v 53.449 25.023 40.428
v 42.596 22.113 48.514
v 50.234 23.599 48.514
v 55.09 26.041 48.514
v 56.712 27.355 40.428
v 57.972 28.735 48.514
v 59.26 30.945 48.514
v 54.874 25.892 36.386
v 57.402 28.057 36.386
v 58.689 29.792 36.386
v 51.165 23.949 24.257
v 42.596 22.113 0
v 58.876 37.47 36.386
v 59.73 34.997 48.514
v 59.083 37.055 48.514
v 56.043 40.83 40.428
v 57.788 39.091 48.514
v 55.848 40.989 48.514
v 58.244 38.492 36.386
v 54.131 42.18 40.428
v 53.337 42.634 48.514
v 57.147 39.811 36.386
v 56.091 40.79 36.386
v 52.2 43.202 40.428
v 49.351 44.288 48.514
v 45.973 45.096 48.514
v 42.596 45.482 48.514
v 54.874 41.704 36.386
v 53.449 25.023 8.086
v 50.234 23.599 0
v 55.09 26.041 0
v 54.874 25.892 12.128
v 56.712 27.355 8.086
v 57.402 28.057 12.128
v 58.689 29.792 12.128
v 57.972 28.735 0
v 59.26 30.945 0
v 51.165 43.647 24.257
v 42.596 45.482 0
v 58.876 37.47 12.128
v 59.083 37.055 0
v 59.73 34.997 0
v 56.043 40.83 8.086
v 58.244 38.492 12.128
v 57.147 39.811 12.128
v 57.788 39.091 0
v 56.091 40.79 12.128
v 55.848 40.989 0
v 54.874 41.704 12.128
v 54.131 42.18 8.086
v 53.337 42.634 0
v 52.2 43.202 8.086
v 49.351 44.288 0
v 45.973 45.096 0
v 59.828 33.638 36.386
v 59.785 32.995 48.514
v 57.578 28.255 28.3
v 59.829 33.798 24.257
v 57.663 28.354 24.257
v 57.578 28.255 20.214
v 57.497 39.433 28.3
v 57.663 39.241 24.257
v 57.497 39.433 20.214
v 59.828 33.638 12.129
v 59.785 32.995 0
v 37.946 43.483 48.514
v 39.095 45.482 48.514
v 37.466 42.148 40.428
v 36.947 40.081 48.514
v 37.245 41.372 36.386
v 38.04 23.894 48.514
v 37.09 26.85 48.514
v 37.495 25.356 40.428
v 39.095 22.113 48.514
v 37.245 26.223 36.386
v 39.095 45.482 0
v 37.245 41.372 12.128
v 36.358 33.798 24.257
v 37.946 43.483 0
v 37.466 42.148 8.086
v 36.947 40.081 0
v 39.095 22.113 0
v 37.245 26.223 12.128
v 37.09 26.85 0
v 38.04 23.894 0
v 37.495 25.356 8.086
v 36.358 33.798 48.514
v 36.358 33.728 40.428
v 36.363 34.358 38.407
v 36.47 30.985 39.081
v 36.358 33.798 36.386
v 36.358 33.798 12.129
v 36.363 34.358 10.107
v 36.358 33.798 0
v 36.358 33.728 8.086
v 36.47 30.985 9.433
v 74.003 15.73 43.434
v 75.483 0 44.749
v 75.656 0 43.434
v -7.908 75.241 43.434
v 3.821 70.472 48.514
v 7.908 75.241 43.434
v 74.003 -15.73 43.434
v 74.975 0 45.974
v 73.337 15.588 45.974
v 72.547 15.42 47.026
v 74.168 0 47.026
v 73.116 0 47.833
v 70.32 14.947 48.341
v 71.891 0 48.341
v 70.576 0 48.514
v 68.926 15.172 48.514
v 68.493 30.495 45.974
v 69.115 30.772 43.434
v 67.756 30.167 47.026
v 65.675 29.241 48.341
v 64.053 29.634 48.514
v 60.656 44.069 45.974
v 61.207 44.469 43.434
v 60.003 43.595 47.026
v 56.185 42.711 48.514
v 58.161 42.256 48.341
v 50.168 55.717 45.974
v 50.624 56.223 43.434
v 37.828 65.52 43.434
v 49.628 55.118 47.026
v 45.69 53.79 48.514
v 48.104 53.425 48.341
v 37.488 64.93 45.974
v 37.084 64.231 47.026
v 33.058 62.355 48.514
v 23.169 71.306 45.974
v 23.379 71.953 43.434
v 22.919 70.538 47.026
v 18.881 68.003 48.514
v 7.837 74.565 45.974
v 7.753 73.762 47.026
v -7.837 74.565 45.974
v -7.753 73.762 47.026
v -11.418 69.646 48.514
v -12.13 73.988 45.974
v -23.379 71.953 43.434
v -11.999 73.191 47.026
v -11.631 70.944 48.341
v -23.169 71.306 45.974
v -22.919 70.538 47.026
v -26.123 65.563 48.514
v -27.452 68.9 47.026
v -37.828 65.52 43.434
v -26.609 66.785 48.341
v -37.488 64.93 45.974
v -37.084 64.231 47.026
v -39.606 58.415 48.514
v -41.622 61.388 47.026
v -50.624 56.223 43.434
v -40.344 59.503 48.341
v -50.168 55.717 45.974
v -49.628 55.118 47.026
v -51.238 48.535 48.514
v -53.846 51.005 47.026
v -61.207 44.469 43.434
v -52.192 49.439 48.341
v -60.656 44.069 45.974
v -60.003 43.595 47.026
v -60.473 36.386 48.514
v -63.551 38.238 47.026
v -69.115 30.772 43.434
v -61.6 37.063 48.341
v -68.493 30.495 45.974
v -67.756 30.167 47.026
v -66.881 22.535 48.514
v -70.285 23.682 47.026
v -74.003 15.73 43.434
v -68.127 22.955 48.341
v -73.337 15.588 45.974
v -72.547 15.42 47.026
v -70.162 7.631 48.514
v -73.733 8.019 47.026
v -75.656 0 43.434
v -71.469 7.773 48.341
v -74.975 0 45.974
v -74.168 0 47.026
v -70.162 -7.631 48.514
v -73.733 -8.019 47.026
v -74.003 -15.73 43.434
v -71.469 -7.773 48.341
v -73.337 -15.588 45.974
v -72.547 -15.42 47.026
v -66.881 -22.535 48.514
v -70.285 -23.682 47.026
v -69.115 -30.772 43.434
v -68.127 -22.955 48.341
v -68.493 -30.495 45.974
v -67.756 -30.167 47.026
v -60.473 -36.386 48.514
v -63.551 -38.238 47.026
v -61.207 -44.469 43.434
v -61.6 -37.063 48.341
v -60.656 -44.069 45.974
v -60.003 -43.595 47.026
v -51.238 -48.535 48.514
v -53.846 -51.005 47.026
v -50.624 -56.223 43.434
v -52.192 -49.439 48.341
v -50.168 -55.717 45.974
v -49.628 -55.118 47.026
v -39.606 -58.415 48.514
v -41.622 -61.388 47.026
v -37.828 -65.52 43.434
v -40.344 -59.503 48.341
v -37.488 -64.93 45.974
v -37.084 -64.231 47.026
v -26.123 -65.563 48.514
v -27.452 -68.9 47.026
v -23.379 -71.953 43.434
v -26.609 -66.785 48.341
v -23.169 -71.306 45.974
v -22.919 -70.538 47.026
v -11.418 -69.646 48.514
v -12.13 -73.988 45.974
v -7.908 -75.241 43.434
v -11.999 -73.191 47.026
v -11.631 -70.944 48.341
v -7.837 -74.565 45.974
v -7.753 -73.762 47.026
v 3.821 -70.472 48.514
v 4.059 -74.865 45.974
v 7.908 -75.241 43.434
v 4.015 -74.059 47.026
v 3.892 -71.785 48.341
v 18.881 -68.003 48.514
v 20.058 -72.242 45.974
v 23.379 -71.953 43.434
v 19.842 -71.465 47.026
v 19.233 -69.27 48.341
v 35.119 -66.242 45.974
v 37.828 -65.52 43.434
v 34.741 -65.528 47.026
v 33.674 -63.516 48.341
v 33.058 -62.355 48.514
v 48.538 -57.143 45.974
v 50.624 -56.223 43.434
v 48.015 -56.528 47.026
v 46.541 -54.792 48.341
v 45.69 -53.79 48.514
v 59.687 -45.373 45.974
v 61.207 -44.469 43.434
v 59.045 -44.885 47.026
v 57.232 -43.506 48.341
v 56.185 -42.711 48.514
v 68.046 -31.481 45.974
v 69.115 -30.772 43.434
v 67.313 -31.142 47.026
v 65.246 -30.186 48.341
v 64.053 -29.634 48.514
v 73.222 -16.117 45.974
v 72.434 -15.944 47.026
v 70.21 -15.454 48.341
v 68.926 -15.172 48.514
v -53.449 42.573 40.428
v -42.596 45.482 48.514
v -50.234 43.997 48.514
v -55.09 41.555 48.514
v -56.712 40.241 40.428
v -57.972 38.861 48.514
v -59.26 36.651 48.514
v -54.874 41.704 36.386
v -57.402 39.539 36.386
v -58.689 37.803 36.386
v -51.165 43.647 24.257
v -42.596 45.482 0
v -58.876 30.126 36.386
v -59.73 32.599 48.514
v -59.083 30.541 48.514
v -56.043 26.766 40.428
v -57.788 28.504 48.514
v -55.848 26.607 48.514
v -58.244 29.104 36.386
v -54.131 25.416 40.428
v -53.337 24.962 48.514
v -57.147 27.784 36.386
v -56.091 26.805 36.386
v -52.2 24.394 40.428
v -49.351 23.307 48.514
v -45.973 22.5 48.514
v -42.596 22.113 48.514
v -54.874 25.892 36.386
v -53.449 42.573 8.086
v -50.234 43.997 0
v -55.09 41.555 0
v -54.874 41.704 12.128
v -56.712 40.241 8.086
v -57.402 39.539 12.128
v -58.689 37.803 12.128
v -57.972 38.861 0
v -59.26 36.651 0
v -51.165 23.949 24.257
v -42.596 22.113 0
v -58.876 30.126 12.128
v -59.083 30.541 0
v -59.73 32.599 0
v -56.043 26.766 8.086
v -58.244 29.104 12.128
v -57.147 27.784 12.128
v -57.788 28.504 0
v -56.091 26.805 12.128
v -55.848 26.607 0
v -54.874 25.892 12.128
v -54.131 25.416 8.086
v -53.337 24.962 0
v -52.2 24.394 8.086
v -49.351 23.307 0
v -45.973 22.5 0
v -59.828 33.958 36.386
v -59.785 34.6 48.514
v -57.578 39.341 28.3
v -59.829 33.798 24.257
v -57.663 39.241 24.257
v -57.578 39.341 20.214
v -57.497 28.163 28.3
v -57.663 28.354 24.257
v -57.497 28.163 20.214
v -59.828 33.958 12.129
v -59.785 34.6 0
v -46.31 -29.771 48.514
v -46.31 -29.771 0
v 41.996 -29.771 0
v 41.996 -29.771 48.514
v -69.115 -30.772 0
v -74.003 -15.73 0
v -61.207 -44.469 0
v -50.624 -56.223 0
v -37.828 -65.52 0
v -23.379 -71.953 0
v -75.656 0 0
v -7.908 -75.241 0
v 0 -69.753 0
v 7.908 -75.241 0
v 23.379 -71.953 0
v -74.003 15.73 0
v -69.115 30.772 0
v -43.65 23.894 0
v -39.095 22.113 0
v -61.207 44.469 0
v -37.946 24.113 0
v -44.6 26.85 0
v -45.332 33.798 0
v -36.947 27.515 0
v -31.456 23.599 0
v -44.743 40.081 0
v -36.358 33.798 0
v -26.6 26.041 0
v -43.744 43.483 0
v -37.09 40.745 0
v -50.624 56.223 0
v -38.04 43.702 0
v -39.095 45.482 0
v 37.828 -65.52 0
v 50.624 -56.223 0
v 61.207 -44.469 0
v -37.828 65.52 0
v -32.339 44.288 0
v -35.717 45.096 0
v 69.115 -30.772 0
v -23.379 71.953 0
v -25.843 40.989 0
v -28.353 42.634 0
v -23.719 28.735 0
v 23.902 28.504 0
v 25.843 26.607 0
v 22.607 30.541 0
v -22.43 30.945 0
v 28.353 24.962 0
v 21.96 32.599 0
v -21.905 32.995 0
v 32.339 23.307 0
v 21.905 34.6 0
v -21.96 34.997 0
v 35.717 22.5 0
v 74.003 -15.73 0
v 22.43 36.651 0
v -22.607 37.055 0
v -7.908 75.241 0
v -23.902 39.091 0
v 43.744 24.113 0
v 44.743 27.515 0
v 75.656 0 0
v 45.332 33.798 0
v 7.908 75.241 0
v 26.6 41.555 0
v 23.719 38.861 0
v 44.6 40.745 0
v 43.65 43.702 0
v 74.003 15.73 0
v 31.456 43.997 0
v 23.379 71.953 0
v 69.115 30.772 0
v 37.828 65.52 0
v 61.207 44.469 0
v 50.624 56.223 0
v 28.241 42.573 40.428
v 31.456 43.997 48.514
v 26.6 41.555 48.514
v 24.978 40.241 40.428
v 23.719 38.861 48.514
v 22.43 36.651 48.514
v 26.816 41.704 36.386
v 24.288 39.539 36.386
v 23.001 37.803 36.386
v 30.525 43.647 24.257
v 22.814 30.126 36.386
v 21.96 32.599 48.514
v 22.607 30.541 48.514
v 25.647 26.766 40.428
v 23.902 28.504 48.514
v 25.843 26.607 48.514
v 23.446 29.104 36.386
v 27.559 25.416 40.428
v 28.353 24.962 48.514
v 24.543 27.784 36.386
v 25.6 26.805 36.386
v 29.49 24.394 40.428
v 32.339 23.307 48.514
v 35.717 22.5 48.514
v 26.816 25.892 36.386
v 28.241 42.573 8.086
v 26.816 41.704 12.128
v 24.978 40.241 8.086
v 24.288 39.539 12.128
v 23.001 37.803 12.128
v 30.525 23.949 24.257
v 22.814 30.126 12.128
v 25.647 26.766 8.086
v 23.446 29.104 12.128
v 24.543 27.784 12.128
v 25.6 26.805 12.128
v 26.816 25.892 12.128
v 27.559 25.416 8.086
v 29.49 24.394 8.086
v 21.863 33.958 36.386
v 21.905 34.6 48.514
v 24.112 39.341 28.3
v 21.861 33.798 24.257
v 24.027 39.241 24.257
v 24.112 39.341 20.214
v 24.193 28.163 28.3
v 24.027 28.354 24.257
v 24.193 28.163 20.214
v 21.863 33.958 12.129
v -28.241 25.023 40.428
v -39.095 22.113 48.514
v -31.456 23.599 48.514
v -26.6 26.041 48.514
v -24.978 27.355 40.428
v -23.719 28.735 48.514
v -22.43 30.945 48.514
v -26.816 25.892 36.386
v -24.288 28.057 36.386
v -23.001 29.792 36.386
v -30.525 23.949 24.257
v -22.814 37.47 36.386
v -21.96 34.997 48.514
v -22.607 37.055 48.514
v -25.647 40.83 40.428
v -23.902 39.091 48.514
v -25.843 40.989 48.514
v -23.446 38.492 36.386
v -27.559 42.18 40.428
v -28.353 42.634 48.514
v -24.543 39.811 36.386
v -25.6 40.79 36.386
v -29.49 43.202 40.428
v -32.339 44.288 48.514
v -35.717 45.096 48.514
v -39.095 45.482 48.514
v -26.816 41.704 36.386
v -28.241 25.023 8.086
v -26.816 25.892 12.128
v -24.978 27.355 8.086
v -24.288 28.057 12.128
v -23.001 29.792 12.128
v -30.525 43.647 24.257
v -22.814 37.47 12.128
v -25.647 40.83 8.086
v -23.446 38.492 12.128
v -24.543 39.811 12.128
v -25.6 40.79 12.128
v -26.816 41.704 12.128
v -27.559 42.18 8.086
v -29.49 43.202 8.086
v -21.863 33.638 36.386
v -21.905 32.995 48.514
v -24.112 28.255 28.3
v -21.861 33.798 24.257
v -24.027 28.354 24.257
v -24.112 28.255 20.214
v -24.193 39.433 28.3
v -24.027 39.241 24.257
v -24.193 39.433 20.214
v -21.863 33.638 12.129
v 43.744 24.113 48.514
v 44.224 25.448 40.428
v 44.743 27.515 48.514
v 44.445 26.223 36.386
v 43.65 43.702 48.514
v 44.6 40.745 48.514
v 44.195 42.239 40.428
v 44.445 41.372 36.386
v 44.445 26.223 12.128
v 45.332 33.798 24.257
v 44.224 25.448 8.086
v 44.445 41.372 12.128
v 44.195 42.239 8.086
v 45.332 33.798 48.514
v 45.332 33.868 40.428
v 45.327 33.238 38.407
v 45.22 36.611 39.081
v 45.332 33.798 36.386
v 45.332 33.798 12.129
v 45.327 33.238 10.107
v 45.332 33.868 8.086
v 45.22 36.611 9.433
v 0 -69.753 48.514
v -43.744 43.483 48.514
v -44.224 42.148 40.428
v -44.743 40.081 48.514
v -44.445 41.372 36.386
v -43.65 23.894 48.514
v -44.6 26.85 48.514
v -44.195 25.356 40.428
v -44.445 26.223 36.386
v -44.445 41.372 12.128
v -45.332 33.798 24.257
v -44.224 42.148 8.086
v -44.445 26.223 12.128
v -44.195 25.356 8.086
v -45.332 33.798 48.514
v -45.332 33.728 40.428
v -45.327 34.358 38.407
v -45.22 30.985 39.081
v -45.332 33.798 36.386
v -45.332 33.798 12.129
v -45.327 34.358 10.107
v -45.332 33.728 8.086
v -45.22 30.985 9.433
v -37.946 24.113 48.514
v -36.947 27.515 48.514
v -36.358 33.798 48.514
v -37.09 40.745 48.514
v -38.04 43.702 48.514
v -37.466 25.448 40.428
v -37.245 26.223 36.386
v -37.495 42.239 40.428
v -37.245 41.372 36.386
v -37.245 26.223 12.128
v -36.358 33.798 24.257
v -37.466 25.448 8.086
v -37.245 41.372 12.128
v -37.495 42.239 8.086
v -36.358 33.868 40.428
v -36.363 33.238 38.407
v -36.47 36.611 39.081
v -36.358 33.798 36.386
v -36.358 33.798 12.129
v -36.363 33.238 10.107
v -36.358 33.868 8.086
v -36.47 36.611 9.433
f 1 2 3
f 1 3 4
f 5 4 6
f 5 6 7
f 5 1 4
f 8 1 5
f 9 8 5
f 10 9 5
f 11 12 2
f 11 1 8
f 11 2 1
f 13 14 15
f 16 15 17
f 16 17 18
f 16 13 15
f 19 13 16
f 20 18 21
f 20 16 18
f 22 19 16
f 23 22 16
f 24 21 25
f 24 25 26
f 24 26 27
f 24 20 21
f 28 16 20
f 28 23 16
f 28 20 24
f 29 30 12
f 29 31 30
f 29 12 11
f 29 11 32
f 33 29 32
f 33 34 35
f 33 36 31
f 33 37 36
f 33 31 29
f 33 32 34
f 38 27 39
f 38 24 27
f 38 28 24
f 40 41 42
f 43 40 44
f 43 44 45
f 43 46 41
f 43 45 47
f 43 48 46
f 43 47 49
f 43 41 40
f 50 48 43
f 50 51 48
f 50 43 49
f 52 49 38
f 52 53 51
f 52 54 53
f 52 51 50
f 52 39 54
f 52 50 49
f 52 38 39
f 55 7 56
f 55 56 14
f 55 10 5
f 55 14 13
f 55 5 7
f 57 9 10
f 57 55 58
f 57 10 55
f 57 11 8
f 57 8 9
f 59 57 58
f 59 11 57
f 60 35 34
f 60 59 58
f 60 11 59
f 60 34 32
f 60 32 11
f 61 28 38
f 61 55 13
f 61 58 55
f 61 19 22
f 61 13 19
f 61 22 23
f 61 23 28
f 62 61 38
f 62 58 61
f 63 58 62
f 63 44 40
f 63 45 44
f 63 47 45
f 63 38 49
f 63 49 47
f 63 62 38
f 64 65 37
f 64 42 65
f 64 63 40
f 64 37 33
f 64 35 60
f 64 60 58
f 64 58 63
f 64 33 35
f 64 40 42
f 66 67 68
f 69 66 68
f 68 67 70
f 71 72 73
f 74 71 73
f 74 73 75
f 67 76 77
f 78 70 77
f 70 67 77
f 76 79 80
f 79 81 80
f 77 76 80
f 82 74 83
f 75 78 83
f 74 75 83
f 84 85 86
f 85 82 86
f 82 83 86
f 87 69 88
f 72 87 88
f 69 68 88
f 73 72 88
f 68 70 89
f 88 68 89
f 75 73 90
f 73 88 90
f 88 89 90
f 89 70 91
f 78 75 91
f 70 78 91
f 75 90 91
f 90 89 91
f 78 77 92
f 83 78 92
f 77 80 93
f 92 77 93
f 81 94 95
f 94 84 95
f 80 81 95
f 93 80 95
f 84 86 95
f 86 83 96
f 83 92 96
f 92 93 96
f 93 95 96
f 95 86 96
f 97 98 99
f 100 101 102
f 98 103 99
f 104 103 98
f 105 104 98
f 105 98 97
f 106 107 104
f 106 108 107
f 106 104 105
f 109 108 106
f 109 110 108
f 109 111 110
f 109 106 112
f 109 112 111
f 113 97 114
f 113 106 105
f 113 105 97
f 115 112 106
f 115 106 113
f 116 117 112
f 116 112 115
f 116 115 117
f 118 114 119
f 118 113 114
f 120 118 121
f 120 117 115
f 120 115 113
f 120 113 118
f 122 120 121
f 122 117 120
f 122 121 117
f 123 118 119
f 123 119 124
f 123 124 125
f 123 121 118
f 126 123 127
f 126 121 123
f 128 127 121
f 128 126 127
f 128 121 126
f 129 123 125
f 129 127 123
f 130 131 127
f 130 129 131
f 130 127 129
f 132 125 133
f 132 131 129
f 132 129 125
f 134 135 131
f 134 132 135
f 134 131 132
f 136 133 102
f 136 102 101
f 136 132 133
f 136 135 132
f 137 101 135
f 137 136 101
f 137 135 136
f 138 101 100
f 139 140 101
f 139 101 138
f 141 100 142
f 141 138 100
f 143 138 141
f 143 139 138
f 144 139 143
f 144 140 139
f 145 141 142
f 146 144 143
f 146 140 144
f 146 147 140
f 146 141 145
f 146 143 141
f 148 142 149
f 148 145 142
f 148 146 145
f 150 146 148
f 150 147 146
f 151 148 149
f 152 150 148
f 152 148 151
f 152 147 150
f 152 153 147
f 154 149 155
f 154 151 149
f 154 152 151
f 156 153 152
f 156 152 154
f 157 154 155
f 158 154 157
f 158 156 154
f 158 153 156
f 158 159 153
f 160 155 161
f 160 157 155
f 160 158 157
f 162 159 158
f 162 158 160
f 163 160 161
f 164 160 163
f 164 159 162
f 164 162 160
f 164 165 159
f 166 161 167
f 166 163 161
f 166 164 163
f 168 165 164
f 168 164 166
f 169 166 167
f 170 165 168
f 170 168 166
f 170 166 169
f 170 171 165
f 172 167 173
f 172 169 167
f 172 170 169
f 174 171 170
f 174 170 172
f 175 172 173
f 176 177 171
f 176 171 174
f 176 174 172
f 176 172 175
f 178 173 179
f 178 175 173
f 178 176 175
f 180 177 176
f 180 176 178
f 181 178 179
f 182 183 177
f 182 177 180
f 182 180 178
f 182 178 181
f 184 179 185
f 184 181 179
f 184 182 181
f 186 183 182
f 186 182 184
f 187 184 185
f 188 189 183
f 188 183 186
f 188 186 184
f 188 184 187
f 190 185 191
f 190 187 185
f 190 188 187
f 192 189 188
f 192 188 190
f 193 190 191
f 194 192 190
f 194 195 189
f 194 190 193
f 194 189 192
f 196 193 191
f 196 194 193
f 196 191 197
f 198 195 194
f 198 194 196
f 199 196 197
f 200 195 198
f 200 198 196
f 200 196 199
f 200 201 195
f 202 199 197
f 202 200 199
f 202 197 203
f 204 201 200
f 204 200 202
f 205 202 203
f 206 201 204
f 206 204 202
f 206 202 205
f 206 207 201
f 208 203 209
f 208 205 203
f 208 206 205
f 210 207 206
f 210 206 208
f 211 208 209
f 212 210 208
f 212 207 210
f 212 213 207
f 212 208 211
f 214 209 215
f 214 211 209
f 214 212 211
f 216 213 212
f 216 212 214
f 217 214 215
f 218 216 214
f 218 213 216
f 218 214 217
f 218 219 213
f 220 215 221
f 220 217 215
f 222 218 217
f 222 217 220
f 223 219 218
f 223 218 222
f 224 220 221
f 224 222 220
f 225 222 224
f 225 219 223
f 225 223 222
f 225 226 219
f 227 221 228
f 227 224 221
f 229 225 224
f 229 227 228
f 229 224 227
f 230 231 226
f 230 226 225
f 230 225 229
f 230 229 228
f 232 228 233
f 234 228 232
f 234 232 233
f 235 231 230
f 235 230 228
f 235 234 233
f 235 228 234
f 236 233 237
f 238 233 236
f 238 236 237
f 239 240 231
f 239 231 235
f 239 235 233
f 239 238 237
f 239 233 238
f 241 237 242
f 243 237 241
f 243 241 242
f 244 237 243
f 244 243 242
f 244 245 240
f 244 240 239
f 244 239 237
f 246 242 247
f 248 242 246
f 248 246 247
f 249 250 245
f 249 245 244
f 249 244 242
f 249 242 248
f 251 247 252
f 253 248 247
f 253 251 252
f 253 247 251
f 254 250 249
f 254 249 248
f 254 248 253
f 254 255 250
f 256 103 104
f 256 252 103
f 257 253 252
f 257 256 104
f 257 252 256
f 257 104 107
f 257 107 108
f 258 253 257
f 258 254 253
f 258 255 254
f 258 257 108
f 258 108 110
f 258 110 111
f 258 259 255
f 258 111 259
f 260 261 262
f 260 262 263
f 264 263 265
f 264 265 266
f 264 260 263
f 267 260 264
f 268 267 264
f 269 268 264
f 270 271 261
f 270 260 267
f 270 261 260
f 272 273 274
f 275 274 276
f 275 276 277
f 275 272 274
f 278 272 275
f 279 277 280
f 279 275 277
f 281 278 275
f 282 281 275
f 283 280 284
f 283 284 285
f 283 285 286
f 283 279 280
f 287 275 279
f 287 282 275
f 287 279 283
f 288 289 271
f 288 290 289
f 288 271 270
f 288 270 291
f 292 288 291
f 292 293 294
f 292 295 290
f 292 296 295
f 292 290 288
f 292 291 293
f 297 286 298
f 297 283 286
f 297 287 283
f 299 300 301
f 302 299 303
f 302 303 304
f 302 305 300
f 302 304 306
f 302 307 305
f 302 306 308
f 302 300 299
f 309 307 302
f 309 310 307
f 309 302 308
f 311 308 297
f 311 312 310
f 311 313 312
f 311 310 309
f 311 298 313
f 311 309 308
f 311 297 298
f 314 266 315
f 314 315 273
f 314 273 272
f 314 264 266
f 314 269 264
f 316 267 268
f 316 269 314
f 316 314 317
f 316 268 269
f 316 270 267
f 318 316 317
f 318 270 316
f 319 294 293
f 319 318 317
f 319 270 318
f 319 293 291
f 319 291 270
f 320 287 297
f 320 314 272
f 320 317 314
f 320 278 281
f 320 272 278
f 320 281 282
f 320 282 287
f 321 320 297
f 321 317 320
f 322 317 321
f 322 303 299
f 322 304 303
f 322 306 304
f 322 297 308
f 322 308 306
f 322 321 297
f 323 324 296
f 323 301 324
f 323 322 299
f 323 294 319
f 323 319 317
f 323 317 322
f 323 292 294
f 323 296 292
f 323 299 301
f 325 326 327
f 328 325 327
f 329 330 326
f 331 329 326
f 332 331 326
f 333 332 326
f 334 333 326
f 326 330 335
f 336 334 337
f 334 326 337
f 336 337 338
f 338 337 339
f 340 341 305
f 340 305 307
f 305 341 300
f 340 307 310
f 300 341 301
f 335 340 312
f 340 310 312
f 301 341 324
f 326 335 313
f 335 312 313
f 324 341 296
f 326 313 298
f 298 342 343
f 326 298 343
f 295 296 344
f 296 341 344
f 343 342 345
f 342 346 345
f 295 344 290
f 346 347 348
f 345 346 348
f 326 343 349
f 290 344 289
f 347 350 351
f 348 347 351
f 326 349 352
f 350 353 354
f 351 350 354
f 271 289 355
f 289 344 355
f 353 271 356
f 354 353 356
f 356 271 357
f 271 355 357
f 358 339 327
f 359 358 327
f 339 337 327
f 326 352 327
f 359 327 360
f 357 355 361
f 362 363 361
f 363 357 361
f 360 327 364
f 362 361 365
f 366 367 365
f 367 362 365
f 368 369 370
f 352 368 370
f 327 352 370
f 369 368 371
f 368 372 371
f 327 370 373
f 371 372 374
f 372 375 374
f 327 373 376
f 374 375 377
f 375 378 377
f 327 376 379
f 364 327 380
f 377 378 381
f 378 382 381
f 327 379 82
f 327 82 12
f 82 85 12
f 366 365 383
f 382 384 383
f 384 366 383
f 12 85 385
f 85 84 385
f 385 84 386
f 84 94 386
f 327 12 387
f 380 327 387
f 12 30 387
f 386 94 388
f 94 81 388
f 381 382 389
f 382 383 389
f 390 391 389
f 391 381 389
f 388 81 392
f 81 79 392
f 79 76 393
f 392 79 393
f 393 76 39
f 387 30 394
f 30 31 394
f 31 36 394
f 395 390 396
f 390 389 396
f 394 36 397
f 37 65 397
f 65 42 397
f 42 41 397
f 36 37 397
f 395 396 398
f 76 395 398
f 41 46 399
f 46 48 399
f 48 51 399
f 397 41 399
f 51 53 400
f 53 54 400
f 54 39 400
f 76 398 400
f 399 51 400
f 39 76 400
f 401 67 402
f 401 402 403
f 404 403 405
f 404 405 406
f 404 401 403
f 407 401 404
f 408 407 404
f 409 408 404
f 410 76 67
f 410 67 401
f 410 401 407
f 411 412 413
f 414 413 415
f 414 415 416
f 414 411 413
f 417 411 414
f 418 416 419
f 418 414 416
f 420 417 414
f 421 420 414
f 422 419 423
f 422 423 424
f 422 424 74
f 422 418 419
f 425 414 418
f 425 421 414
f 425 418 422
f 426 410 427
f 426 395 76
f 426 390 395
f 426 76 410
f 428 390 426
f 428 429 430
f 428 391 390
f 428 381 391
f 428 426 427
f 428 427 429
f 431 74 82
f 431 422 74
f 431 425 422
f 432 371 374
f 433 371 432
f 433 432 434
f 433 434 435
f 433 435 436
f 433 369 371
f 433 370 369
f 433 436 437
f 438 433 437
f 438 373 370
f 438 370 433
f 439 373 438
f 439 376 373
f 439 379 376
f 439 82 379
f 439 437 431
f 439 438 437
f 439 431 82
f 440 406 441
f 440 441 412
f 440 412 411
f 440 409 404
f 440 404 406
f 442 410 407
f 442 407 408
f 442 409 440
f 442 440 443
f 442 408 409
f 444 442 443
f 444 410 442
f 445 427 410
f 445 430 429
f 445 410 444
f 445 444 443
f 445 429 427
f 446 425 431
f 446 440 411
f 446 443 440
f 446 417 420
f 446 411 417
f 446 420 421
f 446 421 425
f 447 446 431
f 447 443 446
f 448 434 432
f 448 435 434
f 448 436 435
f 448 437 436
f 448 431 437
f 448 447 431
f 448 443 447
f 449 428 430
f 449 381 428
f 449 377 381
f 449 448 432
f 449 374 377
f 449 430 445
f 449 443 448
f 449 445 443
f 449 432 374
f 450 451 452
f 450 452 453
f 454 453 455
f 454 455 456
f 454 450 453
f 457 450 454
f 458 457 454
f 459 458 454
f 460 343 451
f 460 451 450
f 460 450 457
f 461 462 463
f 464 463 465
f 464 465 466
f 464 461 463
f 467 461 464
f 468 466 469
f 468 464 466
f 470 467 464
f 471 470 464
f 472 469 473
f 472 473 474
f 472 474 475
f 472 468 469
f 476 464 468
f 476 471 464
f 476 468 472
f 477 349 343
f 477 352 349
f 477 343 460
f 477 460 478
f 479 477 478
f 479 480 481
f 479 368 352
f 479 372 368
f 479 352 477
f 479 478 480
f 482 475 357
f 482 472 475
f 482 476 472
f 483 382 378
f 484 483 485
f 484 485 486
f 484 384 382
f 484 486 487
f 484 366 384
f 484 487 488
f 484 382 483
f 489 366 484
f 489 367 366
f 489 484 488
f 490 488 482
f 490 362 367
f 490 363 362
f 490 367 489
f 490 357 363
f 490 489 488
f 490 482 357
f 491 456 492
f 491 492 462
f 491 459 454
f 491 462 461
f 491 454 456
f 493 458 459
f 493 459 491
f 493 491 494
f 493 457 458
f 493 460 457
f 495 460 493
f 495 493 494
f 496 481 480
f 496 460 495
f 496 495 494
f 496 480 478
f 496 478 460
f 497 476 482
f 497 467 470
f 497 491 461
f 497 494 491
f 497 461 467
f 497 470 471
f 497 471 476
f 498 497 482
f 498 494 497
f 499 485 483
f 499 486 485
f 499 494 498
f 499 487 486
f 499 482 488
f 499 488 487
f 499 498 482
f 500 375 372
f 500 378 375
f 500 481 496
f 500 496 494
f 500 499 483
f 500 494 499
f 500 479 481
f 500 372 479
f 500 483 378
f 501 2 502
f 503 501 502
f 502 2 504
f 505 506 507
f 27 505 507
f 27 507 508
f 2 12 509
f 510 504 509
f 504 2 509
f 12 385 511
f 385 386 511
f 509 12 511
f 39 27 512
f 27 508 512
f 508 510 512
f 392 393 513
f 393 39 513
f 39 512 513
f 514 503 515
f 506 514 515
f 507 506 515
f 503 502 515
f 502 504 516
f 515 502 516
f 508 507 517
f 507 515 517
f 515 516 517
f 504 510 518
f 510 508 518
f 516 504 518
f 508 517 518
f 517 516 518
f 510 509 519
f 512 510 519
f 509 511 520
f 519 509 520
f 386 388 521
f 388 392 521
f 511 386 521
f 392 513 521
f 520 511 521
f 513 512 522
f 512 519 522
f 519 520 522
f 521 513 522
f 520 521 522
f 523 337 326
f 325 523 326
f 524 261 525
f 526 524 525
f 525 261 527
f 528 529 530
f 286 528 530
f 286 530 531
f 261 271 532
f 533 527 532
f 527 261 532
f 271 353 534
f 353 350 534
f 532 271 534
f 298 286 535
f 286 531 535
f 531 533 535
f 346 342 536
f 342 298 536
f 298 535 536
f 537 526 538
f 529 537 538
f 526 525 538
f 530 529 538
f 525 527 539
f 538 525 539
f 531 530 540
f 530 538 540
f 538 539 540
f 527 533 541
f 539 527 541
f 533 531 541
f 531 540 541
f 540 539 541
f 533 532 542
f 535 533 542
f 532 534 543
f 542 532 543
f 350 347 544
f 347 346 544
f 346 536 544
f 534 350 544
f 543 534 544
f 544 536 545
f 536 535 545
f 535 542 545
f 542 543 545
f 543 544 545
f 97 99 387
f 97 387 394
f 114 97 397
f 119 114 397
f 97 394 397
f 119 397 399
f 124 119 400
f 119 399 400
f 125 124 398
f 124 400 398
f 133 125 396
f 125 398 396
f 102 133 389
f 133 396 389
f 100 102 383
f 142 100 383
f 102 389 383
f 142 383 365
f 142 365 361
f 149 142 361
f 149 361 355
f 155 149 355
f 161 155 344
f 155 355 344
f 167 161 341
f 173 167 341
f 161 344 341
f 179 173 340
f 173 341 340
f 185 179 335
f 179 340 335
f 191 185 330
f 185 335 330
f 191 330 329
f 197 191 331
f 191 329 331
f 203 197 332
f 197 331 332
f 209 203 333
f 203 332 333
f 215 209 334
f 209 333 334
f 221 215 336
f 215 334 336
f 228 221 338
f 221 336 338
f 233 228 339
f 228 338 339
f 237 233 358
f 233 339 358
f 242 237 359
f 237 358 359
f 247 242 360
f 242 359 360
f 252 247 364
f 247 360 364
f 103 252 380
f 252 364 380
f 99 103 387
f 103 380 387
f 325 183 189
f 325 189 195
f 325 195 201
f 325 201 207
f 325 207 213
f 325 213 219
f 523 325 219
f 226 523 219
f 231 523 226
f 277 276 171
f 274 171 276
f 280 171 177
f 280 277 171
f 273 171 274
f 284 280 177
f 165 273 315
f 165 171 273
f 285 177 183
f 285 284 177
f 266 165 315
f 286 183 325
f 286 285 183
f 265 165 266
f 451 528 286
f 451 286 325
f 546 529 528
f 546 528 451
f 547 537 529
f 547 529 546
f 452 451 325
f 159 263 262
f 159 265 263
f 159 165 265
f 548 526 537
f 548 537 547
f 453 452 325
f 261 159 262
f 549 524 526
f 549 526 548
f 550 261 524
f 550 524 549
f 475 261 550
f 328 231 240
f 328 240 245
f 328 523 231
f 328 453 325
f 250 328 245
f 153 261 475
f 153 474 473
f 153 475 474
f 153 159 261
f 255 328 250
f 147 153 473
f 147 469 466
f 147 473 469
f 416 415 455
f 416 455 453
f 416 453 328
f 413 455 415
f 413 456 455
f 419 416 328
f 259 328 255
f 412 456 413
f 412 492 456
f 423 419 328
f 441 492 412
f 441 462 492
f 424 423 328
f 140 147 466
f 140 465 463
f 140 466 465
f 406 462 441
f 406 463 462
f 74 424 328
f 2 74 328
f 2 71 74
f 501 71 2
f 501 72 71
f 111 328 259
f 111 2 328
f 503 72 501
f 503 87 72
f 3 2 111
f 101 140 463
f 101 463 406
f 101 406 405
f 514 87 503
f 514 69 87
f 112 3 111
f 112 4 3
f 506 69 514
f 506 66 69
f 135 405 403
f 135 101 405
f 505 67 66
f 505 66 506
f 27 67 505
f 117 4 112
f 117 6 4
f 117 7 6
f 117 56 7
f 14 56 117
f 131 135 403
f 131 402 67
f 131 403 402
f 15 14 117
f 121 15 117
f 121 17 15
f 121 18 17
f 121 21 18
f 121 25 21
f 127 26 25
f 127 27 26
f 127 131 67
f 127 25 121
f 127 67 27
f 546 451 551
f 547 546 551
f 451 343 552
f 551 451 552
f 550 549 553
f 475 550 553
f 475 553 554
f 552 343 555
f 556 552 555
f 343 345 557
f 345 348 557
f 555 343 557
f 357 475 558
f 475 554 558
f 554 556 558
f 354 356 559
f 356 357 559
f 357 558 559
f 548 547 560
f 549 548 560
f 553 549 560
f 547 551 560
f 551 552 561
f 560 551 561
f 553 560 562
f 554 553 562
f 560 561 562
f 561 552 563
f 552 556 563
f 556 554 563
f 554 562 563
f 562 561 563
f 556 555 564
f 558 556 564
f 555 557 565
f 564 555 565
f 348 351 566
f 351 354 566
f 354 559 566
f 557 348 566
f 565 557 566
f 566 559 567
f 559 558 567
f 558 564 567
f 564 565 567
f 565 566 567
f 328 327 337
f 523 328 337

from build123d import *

# Parameters (mm, degrees)
F0_R     = 75.6558411923
F1_DEPTH = 48.514
F2_R     = 5.08


with BuildPart() as f1:
    # F0 (on Top) → F1 (new body)
    with BuildSketch(Plane.XY):
        Circle(F0_R)
        Polygon((0, -69.7530433536), (-46.3102683425, -29.7708865255), (41.9956482947, -29.7708865255), align=None, mode=Mode.SUBTRACT)
        with BuildLine():
            add(Edge.make_bspline(
                [(-21.8607485294, 33.7978675961), (-21.8607485294, 44.4959185344), (-39.0945518587, 45.4823768148)],
                knots=[0, 0, 0, 1.4784559967, 1.4784559967, 1.4784559967], degree=2, weights=[1, 0.73898889, 1]))
            add(Edge.make_bspline(
                [(-39.0945518587, 22.1133583775), (-21.8607485294, 23.0998166579), (-21.8607485294, 33.7978675961)],
                knots=[4.8047293104, 4.8047293104, 4.8047293104, 6.2831853072, 6.2831853072, 6.2831853072], degree=2, weights=[1, 0.73898889, 1]))
            add(Edge.make_bspline(
                [(-40.8450812101, 21.1076120934), (-39.9337015522, 21.1076120934), (-39.0945518587, 22.1133583775)],
                knots=[0, 0, 0, 0.4008066518, 0.4008066518, 0.4008066518], degree=2, weights=[1, 0.9799863696, 1]))
            add(Edge.make_bspline(
                [(-42.5956105616, 22.1133583775), (-41.7564608681, 21.1076120934), (-40.8450812101, 21.1076120934)],
                knots=[5.8823786554, 5.8823786554, 5.8823786554, 6.2831853072, 6.2831853072, 6.2831853072], degree=2, weights=[1, 0.9799863696, 1]))
            add(Edge.make_bspline(
                [(-42.5956105616, 45.4823768148), (-59.8294138908, 44.4959185344), (-59.8294138908, 33.7978675961), (-59.8294138908, 23.0998166579), (-42.5956105616, 22.1133583775)],
                knots=[1.6631366568, 1.6631366568, 1.6631366568, 3.1415926536, 3.1415926536, 4.6200486503, 4.6200486503, 4.6200486503], degree=2, weights=[1, 0.73898889, 1, 0.73898889, 1]))
            add(Edge.make_bspline(
                [(-39.0945518587, 45.4823768148), (-40.8450812101, 47.5804391797), (-42.5956105616, 45.4823768148)],
                knots=[2.7407860018, 2.7407860018, 2.7407860018, 3.5423993054, 3.5423993054, 3.5423993054], degree=2, weights=[1, 0.9207465694, 1]))
        make_face(mode=Mode.SUBTRACT)
        with BuildLine():
            add(Edge.make_bspline(
                [(21.8607485294, 33.7978675961), (21.8607485294, 23.0998166579), (39.0945518587, 22.1133583775)],
                knots=[0, 0, 0, 1.4784559967, 1.4784559967, 1.4784559967], degree=2, weights=[1, 0.73898889, 1]))
            add(Edge.make_bspline(
                [(39.0945518587, 45.4823768148), (21.8607485294, 44.4959185344), (21.8607485294, 33.7978675961)],
                knots=[4.8047293104, 4.8047293104, 4.8047293104, 6.2831853072, 6.2831853072, 6.2831853072], degree=2, weights=[1, 0.73898889, 1]))
            add(Edge.make_bspline(
                [(42.5956105616, 45.4823768148), (40.8450812101, 47.5804391797), (39.0945518587, 45.4823768148)],
                knots=[2.7407860018, 2.7407860018, 2.7407860018, 3.5423993054, 3.5423993054, 3.5423993054], degree=2, weights=[1, 0.9207465694, 1]))
            add(Edge.make_bspline(
                [(42.5956105616, 22.1133583775), (59.8294138908, 23.0998166579), (59.8294138908, 33.7978675961), (59.8294138908, 44.4959185344), (42.5956105616, 45.4823768148)],
                knots=[1.6631366568, 1.6631366568, 1.6631366568, 3.1415926536, 3.1415926536, 4.6200486503, 4.6200486503, 4.6200486503], degree=2, weights=[1, 0.73898889, 1, 0.73898889, 1]))
            add(Edge.make_bspline(
                [(40.8450812101, 21.1076120934), (41.7564608681, 21.1076120934), (42.5956105616, 22.1133583775)],
                knots=[0, 0, 0, 0.4008066518, 0.4008066518, 0.4008066518], degree=2, weights=[1, 0.9799863696, 1]))
            add(Edge.make_bspline(
                [(39.0945518587, 22.1133583775), (39.9337015522, 21.1076120934), (40.8450812101, 21.1076120934)],
                knots=[5.8823786554, 5.8823786554, 5.8823786554, 6.2831853072, 6.2831853072, 6.2831853072], degree=2, weights=[1, 0.9799863696, 1]))
        make_face(mode=Mode.SUBTRACT)
        with BuildLine():
            add(Edge.make_bspline(
                [(-39.0945518587, 22.1133583775), (-29.3455202344, 33.7978675961), (-39.0945518587, 45.4823768148)],
                knots=[0.4008066518, 0.4008066518, 0.4008066518, 2.7407860018, 2.7407860018, 2.7407860018], degree=2, weights=[1, 0.390161191, 1]))
            add(Edge.make_bspline(
                [(-39.0945518587, 45.4823768148), (-40.8450812101, 45.5825766454), (-42.5956105616, 45.4823768148)],
                knots=[1.4784559967, 1.4784559967, 1.4784559967, 1.6631366568, 1.6631366568, 1.6631366568], degree=2, weights=[1, 0.9957396602, 1]))
            add(Edge.make_bspline(
                [(-42.5956105616, 45.4823768148), (-52.3446421858, 33.7978675961), (-42.5956105616, 22.1133583775)],
                knots=[3.5423993054, 3.5423993054, 3.5423993054, 5.8823786554, 5.8823786554, 5.8823786554], degree=2, weights=[1, 0.390161191, 1]))
            add(Edge.make_bspline(
                [(-42.5956105616, 22.1133583775), (-40.8450812101, 22.0131585469), (-39.0945518587, 22.1133583775)],
                knots=[4.6200486503, 4.6200486503, 4.6200486503, 4.8047293104, 4.8047293104, 4.8047293104], degree=2, weights=[1, 0.9957396602, 1]))
        make_face()
        with BuildLine():
            add(Edge.make_bspline(
                [(-39.0945518587, 45.4823768148), (-40.8450812101, 45.5825766454), (-42.5956105616, 45.4823768148)],
                knots=[1.4784559967, 1.4784559967, 1.4784559967, 1.6631366568, 1.6631366568, 1.6631366568], degree=2, weights=[1, 0.9957396602, 1]))
            add(Edge.make_bspline(
                [(-39.0945518587, 45.4823768148), (-40.8450812101, 47.5804391797), (-42.5956105616, 45.4823768148)],
                knots=[2.7407860018, 2.7407860018, 2.7407860018, 3.5423993054, 3.5423993054, 3.5423993054], degree=2, weights=[1, 0.9207465694, 1]))
        make_face()
        with BuildLine():
            add(Edge.make_bspline(
                [(-40.8450812101, 21.1076120934), (-39.9337015522, 21.1076120934), (-39.0945518587, 22.1133583775)],
                knots=[0, 0, 0, 0.4008066518, 0.4008066518, 0.4008066518], degree=2, weights=[1, 0.9799863696, 1]))
            add(Edge.make_bspline(
                [(-42.5956105616, 22.1133583775), (-40.8450812101, 22.0131585469), (-39.0945518587, 22.1133583775)],
                knots=[4.6200486503, 4.6200486503, 4.6200486503, 4.8047293104, 4.8047293104, 4.8047293104], degree=2, weights=[1, 0.9957396602, 1]))
            add(Edge.make_bspline(
                [(-42.5956105616, 22.1133583775), (-41.7564608681, 21.1076120934), (-40.8450812101, 21.1076120934)],
                knots=[5.8823786554, 5.8823786554, 5.8823786554, 6.2831853072, 6.2831853072, 6.2831853072], degree=2, weights=[1, 0.9799863696, 1]))
        make_face()
        with BuildLine():
            add(Edge.make_bspline(
                [(39.0945518587, 45.4823768148), (29.3455202344, 33.7978675961), (39.0945518587, 22.1133583775)],
                knots=[3.5423993054, 3.5423993054, 3.5423993054, 5.8823786554, 5.8823786554, 5.8823786554], degree=2, weights=[1, 0.390161191, 1]))
            add(Edge.make_bspline(
                [(39.0945518587, 22.1133583775), (40.8450812101, 22.0131585469), (42.5956105616, 22.1133583775)],
                knots=[1.4784559967, 1.4784559967, 1.4784559967, 1.6631366568, 1.6631366568, 1.6631366568], degree=2, weights=[1, 0.9957396602, 1]))
            add(Edge.make_bspline(
                [(42.5956105616, 22.1133583775), (52.3446421858, 33.7978675961), (42.5956105616, 45.4823768148)],
                knots=[0.4008066518, 0.4008066518, 0.4008066518, 2.7407860018, 2.7407860018, 2.7407860018], degree=2, weights=[1, 0.390161191, 1]))
            add(Edge.make_bspline(
                [(42.5956105616, 45.4823768148), (40.8450812101, 45.5825766454), (39.0945518587, 45.4823768148)],
                knots=[4.6200486503, 4.6200486503, 4.6200486503, 4.8047293104, 4.8047293104, 4.8047293104], degree=2, weights=[1, 0.9957396602, 1]))
        make_face()
        with BuildLine():
            add(Edge.make_bspline(
                [(39.0945518587, 22.1133583775), (40.8450812101, 22.0131585469), (42.5956105616, 22.1133583775)],
                knots=[1.4784559967, 1.4784559967, 1.4784559967, 1.6631366568, 1.6631366568, 1.6631366568], degree=2, weights=[1, 0.9957396602, 1]))
            add(Edge.make_bspline(
                [(39.0945518587, 22.1133583775), (39.9337015522, 21.1076120934), (40.8450812101, 21.1076120934)],
                knots=[5.8823786554, 5.8823786554, 5.8823786554, 6.2831853072, 6.2831853072, 6.2831853072], degree=2, weights=[1, 0.9799863696, 1]))
            add(Edge.make_bspline(
                [(40.8450812101, 21.1076120934), (41.7564608681, 21.1076120934), (42.5956105616, 22.1133583775)],
                knots=[0, 0, 0, 0.4008066518, 0.4008066518, 0.4008066518], degree=2, weights=[1, 0.9799863696, 1]))
        make_face()
        with BuildLine():
            add(Edge.make_bspline(
                [(42.5956105616, 45.4823768148), (40.8450812101, 47.5804391797), (39.0945518587, 45.4823768148)],
                knots=[2.7407860018, 2.7407860018, 2.7407860018, 3.5423993054, 3.5423993054, 3.5423993054], degree=2, weights=[1, 0.9207465694, 1]))
            add(Edge.make_bspline(
                [(42.5956105616, 45.4823768148), (40.8450812101, 45.5825766454), (39.0945518587, 45.4823768148)],
                knots=[4.6200486503, 4.6200486503, 4.6200486503, 4.8047293104, 4.8047293104, 4.8047293104], degree=2, weights=[1, 0.9957396602, 1]))
        make_face()
    extrude(amount=F1_DEPTH)

    # F2
    f2_edges = [f1.edges().sort_by_distance(p)[0] for p in [
        (-75.655841, 0, 48.514),
    ]]
    fillet(f2_edges, radius=F2_R)


solid = f1.part
